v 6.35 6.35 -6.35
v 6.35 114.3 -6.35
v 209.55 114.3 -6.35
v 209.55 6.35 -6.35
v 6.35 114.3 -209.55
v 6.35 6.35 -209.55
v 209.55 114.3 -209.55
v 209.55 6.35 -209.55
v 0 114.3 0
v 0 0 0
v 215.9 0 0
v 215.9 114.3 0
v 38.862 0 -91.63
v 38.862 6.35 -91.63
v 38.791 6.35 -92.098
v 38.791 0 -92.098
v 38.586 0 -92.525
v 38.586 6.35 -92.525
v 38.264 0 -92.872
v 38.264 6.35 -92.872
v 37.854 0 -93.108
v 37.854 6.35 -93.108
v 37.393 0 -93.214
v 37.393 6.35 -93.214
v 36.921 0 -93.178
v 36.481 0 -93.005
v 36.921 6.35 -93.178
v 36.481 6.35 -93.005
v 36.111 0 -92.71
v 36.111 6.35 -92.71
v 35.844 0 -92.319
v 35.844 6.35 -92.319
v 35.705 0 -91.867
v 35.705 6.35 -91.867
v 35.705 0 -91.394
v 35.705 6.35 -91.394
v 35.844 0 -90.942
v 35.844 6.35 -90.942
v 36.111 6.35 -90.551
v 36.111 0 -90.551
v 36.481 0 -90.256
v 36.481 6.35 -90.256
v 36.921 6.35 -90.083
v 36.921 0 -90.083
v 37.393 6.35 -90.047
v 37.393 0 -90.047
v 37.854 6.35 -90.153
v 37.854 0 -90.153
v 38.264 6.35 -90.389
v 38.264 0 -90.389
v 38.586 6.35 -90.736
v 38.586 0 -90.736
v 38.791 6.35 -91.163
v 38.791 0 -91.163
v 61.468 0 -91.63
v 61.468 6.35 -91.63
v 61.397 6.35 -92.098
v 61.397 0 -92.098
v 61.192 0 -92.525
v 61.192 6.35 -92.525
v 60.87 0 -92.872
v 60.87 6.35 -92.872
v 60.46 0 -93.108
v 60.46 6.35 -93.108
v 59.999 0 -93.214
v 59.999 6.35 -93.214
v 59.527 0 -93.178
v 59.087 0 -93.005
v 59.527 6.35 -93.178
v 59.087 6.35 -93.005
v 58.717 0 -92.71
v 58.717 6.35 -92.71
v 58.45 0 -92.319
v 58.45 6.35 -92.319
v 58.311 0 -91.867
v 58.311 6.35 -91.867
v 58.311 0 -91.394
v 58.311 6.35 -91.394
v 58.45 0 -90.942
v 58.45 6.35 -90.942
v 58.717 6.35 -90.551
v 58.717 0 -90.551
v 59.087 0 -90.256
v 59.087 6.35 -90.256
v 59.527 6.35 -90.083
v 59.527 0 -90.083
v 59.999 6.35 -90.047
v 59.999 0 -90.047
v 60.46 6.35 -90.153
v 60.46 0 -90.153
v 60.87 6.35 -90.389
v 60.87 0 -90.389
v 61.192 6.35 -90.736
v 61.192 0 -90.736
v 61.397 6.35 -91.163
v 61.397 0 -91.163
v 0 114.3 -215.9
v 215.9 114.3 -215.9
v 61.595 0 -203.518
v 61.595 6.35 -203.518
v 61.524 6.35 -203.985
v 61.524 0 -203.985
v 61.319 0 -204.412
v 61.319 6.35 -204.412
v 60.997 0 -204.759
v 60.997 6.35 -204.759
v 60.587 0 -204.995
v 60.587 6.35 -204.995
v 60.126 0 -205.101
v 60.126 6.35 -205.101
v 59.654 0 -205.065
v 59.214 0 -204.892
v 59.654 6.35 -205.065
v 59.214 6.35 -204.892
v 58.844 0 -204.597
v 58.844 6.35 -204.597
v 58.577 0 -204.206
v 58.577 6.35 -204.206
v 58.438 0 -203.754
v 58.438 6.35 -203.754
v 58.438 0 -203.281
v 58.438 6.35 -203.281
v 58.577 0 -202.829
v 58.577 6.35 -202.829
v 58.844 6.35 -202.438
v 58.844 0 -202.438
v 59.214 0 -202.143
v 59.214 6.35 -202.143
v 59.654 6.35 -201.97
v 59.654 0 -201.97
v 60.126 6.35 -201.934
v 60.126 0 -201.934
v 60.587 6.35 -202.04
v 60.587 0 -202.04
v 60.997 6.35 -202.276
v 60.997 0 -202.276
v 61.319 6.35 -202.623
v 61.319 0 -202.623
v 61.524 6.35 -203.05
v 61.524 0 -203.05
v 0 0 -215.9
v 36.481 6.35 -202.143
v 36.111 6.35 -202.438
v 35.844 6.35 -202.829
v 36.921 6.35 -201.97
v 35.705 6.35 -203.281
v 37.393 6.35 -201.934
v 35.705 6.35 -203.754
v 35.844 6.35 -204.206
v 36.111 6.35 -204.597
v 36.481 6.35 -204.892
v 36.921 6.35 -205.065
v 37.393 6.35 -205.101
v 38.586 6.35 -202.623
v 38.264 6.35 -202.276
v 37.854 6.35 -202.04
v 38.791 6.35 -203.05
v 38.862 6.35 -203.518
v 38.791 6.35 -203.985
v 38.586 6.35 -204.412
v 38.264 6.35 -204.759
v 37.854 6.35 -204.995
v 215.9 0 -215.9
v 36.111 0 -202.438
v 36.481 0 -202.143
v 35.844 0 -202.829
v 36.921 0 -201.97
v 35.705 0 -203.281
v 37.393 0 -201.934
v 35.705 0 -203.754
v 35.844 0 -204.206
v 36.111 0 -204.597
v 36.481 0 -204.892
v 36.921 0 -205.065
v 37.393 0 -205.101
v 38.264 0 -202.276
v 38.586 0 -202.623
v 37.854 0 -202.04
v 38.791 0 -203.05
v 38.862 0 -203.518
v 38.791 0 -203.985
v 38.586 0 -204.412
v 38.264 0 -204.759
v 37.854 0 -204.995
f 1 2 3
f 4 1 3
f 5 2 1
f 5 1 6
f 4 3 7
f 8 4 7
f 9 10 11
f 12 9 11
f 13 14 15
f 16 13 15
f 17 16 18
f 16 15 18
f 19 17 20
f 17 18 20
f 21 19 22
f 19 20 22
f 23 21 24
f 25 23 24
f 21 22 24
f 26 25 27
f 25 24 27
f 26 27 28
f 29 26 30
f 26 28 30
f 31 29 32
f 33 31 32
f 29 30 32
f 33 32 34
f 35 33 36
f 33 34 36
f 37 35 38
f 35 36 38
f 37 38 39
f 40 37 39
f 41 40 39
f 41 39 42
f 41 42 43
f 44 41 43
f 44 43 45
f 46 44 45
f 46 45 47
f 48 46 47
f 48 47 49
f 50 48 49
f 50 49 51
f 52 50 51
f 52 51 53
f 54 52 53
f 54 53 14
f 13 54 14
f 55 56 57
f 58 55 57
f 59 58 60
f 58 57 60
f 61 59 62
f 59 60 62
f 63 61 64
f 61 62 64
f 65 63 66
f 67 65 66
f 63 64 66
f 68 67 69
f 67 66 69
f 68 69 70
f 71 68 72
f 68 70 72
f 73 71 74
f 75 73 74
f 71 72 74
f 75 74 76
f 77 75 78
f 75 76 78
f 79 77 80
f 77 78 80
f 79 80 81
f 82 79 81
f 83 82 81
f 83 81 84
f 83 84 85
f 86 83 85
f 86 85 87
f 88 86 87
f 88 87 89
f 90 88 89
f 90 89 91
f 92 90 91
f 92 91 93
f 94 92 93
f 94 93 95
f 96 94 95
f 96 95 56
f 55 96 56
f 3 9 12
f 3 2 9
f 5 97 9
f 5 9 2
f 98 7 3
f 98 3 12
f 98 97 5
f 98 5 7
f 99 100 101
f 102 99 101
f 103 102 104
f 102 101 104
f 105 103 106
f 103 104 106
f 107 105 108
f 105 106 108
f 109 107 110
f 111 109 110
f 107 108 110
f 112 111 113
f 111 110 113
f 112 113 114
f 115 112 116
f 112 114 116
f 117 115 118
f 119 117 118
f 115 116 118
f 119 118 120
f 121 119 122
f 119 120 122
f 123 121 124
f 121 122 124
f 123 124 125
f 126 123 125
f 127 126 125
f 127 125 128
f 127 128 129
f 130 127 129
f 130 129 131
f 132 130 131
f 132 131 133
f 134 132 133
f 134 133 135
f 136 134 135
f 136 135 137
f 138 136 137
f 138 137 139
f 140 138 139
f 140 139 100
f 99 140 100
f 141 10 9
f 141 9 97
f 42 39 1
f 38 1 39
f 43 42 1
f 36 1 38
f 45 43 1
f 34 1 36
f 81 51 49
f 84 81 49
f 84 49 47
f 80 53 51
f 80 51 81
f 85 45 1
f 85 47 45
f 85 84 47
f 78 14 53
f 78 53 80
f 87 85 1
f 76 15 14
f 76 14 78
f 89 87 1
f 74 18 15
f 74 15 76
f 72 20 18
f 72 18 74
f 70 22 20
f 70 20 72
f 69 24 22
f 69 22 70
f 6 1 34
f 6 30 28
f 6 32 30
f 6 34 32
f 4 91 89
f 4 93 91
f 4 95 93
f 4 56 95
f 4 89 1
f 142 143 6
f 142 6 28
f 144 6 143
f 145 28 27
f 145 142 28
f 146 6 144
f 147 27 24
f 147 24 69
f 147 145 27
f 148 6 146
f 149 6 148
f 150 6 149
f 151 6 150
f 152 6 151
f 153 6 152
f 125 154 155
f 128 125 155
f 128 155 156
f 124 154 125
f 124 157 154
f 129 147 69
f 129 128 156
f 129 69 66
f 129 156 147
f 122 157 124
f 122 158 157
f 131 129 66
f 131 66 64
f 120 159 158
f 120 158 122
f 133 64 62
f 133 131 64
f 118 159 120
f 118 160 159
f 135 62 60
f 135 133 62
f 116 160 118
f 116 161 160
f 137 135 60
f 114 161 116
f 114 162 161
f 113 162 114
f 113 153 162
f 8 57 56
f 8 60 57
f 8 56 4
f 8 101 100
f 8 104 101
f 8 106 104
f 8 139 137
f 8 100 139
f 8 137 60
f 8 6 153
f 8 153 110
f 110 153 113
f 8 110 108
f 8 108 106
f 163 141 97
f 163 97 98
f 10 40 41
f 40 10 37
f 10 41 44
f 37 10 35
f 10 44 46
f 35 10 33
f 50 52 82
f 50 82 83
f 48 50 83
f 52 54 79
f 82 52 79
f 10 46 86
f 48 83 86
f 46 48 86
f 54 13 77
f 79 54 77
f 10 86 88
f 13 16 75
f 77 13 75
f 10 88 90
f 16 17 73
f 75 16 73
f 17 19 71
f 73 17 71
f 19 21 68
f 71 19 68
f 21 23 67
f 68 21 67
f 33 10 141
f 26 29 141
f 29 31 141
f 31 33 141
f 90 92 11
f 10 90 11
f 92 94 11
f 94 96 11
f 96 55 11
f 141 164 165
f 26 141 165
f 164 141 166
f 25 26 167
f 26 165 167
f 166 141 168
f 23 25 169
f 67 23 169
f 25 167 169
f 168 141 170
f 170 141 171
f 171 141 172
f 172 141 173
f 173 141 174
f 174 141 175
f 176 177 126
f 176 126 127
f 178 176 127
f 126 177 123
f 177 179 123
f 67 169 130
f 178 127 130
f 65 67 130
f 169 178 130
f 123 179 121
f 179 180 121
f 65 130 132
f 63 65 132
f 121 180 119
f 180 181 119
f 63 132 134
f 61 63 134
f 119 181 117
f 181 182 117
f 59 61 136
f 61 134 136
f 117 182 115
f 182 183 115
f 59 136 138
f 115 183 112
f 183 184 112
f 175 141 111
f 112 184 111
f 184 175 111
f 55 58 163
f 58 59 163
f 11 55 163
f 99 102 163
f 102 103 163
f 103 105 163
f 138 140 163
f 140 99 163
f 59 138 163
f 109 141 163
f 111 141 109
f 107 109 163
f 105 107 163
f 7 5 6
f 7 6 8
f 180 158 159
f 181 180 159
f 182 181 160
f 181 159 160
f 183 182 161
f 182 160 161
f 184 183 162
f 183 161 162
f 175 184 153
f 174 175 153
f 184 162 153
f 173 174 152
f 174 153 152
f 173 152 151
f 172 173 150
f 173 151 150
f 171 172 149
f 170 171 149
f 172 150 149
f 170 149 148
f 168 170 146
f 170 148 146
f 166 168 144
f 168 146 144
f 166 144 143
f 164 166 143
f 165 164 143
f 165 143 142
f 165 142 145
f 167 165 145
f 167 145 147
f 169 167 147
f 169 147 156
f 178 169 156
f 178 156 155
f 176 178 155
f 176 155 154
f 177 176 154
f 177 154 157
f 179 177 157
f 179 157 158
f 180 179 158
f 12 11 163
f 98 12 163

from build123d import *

# Parameters (mm, degrees)
SKETCH1_W           = 215.9
SKETCH1_H           = 215.9
BOSS_EXTRUDE1_DEPTH = 114.3
SKETCH2_W           = 203.2
SKETCH2_H           = 203.2
CUT_EXTRUDE1_DEPTH  = 107.95
MOTOR_DRIVER_R      = 1.5875
CUT_EXTRUDE4_DEPTH  = 107.95


with BuildPart() as part:
    # Sketch1 → Boss-Extrude1 (new body)
    with BuildSketch(Plane(origin=(0, 0, 0), x_dir=(1, 0, 0), z_dir=(0, 1, 0))):
        with Locations((107.95, 107.95)):
            Rectangle(SKETCH1_W, SKETCH1_H)
    extrude(amount=BOSS_EXTRUDE1_DEPTH)

    # Sketch2 → Cut-Extrude1 (cut)
    with BuildSketch(Plane(origin=(0, 114.3, 0), x_dir=(1, 0, 0), z_dir=(0, 1, 0))):
        with Locations((107.95, 107.95)):
            Rectangle(SKETCH2_W, SKETCH2_H)
    extrude(amount=-CUT_EXTRUDE1_DEPTH, mode=Mode.SUBTRACT)

    # Motor Driver → Cut-Extrude4 (cut)
    with BuildSketch(Plane(origin=(0, 6.35, 0), x_dir=(1, 0, 0), z_dir=(0, 1, 0))):
        with Locations((37.2745, 203.5175)):
            Circle(MOTOR_DRIVER_R)
        with Locations((60.0075, 203.5175)):
            Circle(MOTOR_DRIVER_R)
        with Locations((59.8805, 91.6305)):
            Circle(MOTOR_DRIVER_R)
        with Locations((37.2745, 91.6305)):
            Circle(MOTOR_DRIVER_R)
    extrude(amount=-CUT_EXTRUDE4_DEPTH, mode=Mode.SUBTRACT)


solid = part.part
